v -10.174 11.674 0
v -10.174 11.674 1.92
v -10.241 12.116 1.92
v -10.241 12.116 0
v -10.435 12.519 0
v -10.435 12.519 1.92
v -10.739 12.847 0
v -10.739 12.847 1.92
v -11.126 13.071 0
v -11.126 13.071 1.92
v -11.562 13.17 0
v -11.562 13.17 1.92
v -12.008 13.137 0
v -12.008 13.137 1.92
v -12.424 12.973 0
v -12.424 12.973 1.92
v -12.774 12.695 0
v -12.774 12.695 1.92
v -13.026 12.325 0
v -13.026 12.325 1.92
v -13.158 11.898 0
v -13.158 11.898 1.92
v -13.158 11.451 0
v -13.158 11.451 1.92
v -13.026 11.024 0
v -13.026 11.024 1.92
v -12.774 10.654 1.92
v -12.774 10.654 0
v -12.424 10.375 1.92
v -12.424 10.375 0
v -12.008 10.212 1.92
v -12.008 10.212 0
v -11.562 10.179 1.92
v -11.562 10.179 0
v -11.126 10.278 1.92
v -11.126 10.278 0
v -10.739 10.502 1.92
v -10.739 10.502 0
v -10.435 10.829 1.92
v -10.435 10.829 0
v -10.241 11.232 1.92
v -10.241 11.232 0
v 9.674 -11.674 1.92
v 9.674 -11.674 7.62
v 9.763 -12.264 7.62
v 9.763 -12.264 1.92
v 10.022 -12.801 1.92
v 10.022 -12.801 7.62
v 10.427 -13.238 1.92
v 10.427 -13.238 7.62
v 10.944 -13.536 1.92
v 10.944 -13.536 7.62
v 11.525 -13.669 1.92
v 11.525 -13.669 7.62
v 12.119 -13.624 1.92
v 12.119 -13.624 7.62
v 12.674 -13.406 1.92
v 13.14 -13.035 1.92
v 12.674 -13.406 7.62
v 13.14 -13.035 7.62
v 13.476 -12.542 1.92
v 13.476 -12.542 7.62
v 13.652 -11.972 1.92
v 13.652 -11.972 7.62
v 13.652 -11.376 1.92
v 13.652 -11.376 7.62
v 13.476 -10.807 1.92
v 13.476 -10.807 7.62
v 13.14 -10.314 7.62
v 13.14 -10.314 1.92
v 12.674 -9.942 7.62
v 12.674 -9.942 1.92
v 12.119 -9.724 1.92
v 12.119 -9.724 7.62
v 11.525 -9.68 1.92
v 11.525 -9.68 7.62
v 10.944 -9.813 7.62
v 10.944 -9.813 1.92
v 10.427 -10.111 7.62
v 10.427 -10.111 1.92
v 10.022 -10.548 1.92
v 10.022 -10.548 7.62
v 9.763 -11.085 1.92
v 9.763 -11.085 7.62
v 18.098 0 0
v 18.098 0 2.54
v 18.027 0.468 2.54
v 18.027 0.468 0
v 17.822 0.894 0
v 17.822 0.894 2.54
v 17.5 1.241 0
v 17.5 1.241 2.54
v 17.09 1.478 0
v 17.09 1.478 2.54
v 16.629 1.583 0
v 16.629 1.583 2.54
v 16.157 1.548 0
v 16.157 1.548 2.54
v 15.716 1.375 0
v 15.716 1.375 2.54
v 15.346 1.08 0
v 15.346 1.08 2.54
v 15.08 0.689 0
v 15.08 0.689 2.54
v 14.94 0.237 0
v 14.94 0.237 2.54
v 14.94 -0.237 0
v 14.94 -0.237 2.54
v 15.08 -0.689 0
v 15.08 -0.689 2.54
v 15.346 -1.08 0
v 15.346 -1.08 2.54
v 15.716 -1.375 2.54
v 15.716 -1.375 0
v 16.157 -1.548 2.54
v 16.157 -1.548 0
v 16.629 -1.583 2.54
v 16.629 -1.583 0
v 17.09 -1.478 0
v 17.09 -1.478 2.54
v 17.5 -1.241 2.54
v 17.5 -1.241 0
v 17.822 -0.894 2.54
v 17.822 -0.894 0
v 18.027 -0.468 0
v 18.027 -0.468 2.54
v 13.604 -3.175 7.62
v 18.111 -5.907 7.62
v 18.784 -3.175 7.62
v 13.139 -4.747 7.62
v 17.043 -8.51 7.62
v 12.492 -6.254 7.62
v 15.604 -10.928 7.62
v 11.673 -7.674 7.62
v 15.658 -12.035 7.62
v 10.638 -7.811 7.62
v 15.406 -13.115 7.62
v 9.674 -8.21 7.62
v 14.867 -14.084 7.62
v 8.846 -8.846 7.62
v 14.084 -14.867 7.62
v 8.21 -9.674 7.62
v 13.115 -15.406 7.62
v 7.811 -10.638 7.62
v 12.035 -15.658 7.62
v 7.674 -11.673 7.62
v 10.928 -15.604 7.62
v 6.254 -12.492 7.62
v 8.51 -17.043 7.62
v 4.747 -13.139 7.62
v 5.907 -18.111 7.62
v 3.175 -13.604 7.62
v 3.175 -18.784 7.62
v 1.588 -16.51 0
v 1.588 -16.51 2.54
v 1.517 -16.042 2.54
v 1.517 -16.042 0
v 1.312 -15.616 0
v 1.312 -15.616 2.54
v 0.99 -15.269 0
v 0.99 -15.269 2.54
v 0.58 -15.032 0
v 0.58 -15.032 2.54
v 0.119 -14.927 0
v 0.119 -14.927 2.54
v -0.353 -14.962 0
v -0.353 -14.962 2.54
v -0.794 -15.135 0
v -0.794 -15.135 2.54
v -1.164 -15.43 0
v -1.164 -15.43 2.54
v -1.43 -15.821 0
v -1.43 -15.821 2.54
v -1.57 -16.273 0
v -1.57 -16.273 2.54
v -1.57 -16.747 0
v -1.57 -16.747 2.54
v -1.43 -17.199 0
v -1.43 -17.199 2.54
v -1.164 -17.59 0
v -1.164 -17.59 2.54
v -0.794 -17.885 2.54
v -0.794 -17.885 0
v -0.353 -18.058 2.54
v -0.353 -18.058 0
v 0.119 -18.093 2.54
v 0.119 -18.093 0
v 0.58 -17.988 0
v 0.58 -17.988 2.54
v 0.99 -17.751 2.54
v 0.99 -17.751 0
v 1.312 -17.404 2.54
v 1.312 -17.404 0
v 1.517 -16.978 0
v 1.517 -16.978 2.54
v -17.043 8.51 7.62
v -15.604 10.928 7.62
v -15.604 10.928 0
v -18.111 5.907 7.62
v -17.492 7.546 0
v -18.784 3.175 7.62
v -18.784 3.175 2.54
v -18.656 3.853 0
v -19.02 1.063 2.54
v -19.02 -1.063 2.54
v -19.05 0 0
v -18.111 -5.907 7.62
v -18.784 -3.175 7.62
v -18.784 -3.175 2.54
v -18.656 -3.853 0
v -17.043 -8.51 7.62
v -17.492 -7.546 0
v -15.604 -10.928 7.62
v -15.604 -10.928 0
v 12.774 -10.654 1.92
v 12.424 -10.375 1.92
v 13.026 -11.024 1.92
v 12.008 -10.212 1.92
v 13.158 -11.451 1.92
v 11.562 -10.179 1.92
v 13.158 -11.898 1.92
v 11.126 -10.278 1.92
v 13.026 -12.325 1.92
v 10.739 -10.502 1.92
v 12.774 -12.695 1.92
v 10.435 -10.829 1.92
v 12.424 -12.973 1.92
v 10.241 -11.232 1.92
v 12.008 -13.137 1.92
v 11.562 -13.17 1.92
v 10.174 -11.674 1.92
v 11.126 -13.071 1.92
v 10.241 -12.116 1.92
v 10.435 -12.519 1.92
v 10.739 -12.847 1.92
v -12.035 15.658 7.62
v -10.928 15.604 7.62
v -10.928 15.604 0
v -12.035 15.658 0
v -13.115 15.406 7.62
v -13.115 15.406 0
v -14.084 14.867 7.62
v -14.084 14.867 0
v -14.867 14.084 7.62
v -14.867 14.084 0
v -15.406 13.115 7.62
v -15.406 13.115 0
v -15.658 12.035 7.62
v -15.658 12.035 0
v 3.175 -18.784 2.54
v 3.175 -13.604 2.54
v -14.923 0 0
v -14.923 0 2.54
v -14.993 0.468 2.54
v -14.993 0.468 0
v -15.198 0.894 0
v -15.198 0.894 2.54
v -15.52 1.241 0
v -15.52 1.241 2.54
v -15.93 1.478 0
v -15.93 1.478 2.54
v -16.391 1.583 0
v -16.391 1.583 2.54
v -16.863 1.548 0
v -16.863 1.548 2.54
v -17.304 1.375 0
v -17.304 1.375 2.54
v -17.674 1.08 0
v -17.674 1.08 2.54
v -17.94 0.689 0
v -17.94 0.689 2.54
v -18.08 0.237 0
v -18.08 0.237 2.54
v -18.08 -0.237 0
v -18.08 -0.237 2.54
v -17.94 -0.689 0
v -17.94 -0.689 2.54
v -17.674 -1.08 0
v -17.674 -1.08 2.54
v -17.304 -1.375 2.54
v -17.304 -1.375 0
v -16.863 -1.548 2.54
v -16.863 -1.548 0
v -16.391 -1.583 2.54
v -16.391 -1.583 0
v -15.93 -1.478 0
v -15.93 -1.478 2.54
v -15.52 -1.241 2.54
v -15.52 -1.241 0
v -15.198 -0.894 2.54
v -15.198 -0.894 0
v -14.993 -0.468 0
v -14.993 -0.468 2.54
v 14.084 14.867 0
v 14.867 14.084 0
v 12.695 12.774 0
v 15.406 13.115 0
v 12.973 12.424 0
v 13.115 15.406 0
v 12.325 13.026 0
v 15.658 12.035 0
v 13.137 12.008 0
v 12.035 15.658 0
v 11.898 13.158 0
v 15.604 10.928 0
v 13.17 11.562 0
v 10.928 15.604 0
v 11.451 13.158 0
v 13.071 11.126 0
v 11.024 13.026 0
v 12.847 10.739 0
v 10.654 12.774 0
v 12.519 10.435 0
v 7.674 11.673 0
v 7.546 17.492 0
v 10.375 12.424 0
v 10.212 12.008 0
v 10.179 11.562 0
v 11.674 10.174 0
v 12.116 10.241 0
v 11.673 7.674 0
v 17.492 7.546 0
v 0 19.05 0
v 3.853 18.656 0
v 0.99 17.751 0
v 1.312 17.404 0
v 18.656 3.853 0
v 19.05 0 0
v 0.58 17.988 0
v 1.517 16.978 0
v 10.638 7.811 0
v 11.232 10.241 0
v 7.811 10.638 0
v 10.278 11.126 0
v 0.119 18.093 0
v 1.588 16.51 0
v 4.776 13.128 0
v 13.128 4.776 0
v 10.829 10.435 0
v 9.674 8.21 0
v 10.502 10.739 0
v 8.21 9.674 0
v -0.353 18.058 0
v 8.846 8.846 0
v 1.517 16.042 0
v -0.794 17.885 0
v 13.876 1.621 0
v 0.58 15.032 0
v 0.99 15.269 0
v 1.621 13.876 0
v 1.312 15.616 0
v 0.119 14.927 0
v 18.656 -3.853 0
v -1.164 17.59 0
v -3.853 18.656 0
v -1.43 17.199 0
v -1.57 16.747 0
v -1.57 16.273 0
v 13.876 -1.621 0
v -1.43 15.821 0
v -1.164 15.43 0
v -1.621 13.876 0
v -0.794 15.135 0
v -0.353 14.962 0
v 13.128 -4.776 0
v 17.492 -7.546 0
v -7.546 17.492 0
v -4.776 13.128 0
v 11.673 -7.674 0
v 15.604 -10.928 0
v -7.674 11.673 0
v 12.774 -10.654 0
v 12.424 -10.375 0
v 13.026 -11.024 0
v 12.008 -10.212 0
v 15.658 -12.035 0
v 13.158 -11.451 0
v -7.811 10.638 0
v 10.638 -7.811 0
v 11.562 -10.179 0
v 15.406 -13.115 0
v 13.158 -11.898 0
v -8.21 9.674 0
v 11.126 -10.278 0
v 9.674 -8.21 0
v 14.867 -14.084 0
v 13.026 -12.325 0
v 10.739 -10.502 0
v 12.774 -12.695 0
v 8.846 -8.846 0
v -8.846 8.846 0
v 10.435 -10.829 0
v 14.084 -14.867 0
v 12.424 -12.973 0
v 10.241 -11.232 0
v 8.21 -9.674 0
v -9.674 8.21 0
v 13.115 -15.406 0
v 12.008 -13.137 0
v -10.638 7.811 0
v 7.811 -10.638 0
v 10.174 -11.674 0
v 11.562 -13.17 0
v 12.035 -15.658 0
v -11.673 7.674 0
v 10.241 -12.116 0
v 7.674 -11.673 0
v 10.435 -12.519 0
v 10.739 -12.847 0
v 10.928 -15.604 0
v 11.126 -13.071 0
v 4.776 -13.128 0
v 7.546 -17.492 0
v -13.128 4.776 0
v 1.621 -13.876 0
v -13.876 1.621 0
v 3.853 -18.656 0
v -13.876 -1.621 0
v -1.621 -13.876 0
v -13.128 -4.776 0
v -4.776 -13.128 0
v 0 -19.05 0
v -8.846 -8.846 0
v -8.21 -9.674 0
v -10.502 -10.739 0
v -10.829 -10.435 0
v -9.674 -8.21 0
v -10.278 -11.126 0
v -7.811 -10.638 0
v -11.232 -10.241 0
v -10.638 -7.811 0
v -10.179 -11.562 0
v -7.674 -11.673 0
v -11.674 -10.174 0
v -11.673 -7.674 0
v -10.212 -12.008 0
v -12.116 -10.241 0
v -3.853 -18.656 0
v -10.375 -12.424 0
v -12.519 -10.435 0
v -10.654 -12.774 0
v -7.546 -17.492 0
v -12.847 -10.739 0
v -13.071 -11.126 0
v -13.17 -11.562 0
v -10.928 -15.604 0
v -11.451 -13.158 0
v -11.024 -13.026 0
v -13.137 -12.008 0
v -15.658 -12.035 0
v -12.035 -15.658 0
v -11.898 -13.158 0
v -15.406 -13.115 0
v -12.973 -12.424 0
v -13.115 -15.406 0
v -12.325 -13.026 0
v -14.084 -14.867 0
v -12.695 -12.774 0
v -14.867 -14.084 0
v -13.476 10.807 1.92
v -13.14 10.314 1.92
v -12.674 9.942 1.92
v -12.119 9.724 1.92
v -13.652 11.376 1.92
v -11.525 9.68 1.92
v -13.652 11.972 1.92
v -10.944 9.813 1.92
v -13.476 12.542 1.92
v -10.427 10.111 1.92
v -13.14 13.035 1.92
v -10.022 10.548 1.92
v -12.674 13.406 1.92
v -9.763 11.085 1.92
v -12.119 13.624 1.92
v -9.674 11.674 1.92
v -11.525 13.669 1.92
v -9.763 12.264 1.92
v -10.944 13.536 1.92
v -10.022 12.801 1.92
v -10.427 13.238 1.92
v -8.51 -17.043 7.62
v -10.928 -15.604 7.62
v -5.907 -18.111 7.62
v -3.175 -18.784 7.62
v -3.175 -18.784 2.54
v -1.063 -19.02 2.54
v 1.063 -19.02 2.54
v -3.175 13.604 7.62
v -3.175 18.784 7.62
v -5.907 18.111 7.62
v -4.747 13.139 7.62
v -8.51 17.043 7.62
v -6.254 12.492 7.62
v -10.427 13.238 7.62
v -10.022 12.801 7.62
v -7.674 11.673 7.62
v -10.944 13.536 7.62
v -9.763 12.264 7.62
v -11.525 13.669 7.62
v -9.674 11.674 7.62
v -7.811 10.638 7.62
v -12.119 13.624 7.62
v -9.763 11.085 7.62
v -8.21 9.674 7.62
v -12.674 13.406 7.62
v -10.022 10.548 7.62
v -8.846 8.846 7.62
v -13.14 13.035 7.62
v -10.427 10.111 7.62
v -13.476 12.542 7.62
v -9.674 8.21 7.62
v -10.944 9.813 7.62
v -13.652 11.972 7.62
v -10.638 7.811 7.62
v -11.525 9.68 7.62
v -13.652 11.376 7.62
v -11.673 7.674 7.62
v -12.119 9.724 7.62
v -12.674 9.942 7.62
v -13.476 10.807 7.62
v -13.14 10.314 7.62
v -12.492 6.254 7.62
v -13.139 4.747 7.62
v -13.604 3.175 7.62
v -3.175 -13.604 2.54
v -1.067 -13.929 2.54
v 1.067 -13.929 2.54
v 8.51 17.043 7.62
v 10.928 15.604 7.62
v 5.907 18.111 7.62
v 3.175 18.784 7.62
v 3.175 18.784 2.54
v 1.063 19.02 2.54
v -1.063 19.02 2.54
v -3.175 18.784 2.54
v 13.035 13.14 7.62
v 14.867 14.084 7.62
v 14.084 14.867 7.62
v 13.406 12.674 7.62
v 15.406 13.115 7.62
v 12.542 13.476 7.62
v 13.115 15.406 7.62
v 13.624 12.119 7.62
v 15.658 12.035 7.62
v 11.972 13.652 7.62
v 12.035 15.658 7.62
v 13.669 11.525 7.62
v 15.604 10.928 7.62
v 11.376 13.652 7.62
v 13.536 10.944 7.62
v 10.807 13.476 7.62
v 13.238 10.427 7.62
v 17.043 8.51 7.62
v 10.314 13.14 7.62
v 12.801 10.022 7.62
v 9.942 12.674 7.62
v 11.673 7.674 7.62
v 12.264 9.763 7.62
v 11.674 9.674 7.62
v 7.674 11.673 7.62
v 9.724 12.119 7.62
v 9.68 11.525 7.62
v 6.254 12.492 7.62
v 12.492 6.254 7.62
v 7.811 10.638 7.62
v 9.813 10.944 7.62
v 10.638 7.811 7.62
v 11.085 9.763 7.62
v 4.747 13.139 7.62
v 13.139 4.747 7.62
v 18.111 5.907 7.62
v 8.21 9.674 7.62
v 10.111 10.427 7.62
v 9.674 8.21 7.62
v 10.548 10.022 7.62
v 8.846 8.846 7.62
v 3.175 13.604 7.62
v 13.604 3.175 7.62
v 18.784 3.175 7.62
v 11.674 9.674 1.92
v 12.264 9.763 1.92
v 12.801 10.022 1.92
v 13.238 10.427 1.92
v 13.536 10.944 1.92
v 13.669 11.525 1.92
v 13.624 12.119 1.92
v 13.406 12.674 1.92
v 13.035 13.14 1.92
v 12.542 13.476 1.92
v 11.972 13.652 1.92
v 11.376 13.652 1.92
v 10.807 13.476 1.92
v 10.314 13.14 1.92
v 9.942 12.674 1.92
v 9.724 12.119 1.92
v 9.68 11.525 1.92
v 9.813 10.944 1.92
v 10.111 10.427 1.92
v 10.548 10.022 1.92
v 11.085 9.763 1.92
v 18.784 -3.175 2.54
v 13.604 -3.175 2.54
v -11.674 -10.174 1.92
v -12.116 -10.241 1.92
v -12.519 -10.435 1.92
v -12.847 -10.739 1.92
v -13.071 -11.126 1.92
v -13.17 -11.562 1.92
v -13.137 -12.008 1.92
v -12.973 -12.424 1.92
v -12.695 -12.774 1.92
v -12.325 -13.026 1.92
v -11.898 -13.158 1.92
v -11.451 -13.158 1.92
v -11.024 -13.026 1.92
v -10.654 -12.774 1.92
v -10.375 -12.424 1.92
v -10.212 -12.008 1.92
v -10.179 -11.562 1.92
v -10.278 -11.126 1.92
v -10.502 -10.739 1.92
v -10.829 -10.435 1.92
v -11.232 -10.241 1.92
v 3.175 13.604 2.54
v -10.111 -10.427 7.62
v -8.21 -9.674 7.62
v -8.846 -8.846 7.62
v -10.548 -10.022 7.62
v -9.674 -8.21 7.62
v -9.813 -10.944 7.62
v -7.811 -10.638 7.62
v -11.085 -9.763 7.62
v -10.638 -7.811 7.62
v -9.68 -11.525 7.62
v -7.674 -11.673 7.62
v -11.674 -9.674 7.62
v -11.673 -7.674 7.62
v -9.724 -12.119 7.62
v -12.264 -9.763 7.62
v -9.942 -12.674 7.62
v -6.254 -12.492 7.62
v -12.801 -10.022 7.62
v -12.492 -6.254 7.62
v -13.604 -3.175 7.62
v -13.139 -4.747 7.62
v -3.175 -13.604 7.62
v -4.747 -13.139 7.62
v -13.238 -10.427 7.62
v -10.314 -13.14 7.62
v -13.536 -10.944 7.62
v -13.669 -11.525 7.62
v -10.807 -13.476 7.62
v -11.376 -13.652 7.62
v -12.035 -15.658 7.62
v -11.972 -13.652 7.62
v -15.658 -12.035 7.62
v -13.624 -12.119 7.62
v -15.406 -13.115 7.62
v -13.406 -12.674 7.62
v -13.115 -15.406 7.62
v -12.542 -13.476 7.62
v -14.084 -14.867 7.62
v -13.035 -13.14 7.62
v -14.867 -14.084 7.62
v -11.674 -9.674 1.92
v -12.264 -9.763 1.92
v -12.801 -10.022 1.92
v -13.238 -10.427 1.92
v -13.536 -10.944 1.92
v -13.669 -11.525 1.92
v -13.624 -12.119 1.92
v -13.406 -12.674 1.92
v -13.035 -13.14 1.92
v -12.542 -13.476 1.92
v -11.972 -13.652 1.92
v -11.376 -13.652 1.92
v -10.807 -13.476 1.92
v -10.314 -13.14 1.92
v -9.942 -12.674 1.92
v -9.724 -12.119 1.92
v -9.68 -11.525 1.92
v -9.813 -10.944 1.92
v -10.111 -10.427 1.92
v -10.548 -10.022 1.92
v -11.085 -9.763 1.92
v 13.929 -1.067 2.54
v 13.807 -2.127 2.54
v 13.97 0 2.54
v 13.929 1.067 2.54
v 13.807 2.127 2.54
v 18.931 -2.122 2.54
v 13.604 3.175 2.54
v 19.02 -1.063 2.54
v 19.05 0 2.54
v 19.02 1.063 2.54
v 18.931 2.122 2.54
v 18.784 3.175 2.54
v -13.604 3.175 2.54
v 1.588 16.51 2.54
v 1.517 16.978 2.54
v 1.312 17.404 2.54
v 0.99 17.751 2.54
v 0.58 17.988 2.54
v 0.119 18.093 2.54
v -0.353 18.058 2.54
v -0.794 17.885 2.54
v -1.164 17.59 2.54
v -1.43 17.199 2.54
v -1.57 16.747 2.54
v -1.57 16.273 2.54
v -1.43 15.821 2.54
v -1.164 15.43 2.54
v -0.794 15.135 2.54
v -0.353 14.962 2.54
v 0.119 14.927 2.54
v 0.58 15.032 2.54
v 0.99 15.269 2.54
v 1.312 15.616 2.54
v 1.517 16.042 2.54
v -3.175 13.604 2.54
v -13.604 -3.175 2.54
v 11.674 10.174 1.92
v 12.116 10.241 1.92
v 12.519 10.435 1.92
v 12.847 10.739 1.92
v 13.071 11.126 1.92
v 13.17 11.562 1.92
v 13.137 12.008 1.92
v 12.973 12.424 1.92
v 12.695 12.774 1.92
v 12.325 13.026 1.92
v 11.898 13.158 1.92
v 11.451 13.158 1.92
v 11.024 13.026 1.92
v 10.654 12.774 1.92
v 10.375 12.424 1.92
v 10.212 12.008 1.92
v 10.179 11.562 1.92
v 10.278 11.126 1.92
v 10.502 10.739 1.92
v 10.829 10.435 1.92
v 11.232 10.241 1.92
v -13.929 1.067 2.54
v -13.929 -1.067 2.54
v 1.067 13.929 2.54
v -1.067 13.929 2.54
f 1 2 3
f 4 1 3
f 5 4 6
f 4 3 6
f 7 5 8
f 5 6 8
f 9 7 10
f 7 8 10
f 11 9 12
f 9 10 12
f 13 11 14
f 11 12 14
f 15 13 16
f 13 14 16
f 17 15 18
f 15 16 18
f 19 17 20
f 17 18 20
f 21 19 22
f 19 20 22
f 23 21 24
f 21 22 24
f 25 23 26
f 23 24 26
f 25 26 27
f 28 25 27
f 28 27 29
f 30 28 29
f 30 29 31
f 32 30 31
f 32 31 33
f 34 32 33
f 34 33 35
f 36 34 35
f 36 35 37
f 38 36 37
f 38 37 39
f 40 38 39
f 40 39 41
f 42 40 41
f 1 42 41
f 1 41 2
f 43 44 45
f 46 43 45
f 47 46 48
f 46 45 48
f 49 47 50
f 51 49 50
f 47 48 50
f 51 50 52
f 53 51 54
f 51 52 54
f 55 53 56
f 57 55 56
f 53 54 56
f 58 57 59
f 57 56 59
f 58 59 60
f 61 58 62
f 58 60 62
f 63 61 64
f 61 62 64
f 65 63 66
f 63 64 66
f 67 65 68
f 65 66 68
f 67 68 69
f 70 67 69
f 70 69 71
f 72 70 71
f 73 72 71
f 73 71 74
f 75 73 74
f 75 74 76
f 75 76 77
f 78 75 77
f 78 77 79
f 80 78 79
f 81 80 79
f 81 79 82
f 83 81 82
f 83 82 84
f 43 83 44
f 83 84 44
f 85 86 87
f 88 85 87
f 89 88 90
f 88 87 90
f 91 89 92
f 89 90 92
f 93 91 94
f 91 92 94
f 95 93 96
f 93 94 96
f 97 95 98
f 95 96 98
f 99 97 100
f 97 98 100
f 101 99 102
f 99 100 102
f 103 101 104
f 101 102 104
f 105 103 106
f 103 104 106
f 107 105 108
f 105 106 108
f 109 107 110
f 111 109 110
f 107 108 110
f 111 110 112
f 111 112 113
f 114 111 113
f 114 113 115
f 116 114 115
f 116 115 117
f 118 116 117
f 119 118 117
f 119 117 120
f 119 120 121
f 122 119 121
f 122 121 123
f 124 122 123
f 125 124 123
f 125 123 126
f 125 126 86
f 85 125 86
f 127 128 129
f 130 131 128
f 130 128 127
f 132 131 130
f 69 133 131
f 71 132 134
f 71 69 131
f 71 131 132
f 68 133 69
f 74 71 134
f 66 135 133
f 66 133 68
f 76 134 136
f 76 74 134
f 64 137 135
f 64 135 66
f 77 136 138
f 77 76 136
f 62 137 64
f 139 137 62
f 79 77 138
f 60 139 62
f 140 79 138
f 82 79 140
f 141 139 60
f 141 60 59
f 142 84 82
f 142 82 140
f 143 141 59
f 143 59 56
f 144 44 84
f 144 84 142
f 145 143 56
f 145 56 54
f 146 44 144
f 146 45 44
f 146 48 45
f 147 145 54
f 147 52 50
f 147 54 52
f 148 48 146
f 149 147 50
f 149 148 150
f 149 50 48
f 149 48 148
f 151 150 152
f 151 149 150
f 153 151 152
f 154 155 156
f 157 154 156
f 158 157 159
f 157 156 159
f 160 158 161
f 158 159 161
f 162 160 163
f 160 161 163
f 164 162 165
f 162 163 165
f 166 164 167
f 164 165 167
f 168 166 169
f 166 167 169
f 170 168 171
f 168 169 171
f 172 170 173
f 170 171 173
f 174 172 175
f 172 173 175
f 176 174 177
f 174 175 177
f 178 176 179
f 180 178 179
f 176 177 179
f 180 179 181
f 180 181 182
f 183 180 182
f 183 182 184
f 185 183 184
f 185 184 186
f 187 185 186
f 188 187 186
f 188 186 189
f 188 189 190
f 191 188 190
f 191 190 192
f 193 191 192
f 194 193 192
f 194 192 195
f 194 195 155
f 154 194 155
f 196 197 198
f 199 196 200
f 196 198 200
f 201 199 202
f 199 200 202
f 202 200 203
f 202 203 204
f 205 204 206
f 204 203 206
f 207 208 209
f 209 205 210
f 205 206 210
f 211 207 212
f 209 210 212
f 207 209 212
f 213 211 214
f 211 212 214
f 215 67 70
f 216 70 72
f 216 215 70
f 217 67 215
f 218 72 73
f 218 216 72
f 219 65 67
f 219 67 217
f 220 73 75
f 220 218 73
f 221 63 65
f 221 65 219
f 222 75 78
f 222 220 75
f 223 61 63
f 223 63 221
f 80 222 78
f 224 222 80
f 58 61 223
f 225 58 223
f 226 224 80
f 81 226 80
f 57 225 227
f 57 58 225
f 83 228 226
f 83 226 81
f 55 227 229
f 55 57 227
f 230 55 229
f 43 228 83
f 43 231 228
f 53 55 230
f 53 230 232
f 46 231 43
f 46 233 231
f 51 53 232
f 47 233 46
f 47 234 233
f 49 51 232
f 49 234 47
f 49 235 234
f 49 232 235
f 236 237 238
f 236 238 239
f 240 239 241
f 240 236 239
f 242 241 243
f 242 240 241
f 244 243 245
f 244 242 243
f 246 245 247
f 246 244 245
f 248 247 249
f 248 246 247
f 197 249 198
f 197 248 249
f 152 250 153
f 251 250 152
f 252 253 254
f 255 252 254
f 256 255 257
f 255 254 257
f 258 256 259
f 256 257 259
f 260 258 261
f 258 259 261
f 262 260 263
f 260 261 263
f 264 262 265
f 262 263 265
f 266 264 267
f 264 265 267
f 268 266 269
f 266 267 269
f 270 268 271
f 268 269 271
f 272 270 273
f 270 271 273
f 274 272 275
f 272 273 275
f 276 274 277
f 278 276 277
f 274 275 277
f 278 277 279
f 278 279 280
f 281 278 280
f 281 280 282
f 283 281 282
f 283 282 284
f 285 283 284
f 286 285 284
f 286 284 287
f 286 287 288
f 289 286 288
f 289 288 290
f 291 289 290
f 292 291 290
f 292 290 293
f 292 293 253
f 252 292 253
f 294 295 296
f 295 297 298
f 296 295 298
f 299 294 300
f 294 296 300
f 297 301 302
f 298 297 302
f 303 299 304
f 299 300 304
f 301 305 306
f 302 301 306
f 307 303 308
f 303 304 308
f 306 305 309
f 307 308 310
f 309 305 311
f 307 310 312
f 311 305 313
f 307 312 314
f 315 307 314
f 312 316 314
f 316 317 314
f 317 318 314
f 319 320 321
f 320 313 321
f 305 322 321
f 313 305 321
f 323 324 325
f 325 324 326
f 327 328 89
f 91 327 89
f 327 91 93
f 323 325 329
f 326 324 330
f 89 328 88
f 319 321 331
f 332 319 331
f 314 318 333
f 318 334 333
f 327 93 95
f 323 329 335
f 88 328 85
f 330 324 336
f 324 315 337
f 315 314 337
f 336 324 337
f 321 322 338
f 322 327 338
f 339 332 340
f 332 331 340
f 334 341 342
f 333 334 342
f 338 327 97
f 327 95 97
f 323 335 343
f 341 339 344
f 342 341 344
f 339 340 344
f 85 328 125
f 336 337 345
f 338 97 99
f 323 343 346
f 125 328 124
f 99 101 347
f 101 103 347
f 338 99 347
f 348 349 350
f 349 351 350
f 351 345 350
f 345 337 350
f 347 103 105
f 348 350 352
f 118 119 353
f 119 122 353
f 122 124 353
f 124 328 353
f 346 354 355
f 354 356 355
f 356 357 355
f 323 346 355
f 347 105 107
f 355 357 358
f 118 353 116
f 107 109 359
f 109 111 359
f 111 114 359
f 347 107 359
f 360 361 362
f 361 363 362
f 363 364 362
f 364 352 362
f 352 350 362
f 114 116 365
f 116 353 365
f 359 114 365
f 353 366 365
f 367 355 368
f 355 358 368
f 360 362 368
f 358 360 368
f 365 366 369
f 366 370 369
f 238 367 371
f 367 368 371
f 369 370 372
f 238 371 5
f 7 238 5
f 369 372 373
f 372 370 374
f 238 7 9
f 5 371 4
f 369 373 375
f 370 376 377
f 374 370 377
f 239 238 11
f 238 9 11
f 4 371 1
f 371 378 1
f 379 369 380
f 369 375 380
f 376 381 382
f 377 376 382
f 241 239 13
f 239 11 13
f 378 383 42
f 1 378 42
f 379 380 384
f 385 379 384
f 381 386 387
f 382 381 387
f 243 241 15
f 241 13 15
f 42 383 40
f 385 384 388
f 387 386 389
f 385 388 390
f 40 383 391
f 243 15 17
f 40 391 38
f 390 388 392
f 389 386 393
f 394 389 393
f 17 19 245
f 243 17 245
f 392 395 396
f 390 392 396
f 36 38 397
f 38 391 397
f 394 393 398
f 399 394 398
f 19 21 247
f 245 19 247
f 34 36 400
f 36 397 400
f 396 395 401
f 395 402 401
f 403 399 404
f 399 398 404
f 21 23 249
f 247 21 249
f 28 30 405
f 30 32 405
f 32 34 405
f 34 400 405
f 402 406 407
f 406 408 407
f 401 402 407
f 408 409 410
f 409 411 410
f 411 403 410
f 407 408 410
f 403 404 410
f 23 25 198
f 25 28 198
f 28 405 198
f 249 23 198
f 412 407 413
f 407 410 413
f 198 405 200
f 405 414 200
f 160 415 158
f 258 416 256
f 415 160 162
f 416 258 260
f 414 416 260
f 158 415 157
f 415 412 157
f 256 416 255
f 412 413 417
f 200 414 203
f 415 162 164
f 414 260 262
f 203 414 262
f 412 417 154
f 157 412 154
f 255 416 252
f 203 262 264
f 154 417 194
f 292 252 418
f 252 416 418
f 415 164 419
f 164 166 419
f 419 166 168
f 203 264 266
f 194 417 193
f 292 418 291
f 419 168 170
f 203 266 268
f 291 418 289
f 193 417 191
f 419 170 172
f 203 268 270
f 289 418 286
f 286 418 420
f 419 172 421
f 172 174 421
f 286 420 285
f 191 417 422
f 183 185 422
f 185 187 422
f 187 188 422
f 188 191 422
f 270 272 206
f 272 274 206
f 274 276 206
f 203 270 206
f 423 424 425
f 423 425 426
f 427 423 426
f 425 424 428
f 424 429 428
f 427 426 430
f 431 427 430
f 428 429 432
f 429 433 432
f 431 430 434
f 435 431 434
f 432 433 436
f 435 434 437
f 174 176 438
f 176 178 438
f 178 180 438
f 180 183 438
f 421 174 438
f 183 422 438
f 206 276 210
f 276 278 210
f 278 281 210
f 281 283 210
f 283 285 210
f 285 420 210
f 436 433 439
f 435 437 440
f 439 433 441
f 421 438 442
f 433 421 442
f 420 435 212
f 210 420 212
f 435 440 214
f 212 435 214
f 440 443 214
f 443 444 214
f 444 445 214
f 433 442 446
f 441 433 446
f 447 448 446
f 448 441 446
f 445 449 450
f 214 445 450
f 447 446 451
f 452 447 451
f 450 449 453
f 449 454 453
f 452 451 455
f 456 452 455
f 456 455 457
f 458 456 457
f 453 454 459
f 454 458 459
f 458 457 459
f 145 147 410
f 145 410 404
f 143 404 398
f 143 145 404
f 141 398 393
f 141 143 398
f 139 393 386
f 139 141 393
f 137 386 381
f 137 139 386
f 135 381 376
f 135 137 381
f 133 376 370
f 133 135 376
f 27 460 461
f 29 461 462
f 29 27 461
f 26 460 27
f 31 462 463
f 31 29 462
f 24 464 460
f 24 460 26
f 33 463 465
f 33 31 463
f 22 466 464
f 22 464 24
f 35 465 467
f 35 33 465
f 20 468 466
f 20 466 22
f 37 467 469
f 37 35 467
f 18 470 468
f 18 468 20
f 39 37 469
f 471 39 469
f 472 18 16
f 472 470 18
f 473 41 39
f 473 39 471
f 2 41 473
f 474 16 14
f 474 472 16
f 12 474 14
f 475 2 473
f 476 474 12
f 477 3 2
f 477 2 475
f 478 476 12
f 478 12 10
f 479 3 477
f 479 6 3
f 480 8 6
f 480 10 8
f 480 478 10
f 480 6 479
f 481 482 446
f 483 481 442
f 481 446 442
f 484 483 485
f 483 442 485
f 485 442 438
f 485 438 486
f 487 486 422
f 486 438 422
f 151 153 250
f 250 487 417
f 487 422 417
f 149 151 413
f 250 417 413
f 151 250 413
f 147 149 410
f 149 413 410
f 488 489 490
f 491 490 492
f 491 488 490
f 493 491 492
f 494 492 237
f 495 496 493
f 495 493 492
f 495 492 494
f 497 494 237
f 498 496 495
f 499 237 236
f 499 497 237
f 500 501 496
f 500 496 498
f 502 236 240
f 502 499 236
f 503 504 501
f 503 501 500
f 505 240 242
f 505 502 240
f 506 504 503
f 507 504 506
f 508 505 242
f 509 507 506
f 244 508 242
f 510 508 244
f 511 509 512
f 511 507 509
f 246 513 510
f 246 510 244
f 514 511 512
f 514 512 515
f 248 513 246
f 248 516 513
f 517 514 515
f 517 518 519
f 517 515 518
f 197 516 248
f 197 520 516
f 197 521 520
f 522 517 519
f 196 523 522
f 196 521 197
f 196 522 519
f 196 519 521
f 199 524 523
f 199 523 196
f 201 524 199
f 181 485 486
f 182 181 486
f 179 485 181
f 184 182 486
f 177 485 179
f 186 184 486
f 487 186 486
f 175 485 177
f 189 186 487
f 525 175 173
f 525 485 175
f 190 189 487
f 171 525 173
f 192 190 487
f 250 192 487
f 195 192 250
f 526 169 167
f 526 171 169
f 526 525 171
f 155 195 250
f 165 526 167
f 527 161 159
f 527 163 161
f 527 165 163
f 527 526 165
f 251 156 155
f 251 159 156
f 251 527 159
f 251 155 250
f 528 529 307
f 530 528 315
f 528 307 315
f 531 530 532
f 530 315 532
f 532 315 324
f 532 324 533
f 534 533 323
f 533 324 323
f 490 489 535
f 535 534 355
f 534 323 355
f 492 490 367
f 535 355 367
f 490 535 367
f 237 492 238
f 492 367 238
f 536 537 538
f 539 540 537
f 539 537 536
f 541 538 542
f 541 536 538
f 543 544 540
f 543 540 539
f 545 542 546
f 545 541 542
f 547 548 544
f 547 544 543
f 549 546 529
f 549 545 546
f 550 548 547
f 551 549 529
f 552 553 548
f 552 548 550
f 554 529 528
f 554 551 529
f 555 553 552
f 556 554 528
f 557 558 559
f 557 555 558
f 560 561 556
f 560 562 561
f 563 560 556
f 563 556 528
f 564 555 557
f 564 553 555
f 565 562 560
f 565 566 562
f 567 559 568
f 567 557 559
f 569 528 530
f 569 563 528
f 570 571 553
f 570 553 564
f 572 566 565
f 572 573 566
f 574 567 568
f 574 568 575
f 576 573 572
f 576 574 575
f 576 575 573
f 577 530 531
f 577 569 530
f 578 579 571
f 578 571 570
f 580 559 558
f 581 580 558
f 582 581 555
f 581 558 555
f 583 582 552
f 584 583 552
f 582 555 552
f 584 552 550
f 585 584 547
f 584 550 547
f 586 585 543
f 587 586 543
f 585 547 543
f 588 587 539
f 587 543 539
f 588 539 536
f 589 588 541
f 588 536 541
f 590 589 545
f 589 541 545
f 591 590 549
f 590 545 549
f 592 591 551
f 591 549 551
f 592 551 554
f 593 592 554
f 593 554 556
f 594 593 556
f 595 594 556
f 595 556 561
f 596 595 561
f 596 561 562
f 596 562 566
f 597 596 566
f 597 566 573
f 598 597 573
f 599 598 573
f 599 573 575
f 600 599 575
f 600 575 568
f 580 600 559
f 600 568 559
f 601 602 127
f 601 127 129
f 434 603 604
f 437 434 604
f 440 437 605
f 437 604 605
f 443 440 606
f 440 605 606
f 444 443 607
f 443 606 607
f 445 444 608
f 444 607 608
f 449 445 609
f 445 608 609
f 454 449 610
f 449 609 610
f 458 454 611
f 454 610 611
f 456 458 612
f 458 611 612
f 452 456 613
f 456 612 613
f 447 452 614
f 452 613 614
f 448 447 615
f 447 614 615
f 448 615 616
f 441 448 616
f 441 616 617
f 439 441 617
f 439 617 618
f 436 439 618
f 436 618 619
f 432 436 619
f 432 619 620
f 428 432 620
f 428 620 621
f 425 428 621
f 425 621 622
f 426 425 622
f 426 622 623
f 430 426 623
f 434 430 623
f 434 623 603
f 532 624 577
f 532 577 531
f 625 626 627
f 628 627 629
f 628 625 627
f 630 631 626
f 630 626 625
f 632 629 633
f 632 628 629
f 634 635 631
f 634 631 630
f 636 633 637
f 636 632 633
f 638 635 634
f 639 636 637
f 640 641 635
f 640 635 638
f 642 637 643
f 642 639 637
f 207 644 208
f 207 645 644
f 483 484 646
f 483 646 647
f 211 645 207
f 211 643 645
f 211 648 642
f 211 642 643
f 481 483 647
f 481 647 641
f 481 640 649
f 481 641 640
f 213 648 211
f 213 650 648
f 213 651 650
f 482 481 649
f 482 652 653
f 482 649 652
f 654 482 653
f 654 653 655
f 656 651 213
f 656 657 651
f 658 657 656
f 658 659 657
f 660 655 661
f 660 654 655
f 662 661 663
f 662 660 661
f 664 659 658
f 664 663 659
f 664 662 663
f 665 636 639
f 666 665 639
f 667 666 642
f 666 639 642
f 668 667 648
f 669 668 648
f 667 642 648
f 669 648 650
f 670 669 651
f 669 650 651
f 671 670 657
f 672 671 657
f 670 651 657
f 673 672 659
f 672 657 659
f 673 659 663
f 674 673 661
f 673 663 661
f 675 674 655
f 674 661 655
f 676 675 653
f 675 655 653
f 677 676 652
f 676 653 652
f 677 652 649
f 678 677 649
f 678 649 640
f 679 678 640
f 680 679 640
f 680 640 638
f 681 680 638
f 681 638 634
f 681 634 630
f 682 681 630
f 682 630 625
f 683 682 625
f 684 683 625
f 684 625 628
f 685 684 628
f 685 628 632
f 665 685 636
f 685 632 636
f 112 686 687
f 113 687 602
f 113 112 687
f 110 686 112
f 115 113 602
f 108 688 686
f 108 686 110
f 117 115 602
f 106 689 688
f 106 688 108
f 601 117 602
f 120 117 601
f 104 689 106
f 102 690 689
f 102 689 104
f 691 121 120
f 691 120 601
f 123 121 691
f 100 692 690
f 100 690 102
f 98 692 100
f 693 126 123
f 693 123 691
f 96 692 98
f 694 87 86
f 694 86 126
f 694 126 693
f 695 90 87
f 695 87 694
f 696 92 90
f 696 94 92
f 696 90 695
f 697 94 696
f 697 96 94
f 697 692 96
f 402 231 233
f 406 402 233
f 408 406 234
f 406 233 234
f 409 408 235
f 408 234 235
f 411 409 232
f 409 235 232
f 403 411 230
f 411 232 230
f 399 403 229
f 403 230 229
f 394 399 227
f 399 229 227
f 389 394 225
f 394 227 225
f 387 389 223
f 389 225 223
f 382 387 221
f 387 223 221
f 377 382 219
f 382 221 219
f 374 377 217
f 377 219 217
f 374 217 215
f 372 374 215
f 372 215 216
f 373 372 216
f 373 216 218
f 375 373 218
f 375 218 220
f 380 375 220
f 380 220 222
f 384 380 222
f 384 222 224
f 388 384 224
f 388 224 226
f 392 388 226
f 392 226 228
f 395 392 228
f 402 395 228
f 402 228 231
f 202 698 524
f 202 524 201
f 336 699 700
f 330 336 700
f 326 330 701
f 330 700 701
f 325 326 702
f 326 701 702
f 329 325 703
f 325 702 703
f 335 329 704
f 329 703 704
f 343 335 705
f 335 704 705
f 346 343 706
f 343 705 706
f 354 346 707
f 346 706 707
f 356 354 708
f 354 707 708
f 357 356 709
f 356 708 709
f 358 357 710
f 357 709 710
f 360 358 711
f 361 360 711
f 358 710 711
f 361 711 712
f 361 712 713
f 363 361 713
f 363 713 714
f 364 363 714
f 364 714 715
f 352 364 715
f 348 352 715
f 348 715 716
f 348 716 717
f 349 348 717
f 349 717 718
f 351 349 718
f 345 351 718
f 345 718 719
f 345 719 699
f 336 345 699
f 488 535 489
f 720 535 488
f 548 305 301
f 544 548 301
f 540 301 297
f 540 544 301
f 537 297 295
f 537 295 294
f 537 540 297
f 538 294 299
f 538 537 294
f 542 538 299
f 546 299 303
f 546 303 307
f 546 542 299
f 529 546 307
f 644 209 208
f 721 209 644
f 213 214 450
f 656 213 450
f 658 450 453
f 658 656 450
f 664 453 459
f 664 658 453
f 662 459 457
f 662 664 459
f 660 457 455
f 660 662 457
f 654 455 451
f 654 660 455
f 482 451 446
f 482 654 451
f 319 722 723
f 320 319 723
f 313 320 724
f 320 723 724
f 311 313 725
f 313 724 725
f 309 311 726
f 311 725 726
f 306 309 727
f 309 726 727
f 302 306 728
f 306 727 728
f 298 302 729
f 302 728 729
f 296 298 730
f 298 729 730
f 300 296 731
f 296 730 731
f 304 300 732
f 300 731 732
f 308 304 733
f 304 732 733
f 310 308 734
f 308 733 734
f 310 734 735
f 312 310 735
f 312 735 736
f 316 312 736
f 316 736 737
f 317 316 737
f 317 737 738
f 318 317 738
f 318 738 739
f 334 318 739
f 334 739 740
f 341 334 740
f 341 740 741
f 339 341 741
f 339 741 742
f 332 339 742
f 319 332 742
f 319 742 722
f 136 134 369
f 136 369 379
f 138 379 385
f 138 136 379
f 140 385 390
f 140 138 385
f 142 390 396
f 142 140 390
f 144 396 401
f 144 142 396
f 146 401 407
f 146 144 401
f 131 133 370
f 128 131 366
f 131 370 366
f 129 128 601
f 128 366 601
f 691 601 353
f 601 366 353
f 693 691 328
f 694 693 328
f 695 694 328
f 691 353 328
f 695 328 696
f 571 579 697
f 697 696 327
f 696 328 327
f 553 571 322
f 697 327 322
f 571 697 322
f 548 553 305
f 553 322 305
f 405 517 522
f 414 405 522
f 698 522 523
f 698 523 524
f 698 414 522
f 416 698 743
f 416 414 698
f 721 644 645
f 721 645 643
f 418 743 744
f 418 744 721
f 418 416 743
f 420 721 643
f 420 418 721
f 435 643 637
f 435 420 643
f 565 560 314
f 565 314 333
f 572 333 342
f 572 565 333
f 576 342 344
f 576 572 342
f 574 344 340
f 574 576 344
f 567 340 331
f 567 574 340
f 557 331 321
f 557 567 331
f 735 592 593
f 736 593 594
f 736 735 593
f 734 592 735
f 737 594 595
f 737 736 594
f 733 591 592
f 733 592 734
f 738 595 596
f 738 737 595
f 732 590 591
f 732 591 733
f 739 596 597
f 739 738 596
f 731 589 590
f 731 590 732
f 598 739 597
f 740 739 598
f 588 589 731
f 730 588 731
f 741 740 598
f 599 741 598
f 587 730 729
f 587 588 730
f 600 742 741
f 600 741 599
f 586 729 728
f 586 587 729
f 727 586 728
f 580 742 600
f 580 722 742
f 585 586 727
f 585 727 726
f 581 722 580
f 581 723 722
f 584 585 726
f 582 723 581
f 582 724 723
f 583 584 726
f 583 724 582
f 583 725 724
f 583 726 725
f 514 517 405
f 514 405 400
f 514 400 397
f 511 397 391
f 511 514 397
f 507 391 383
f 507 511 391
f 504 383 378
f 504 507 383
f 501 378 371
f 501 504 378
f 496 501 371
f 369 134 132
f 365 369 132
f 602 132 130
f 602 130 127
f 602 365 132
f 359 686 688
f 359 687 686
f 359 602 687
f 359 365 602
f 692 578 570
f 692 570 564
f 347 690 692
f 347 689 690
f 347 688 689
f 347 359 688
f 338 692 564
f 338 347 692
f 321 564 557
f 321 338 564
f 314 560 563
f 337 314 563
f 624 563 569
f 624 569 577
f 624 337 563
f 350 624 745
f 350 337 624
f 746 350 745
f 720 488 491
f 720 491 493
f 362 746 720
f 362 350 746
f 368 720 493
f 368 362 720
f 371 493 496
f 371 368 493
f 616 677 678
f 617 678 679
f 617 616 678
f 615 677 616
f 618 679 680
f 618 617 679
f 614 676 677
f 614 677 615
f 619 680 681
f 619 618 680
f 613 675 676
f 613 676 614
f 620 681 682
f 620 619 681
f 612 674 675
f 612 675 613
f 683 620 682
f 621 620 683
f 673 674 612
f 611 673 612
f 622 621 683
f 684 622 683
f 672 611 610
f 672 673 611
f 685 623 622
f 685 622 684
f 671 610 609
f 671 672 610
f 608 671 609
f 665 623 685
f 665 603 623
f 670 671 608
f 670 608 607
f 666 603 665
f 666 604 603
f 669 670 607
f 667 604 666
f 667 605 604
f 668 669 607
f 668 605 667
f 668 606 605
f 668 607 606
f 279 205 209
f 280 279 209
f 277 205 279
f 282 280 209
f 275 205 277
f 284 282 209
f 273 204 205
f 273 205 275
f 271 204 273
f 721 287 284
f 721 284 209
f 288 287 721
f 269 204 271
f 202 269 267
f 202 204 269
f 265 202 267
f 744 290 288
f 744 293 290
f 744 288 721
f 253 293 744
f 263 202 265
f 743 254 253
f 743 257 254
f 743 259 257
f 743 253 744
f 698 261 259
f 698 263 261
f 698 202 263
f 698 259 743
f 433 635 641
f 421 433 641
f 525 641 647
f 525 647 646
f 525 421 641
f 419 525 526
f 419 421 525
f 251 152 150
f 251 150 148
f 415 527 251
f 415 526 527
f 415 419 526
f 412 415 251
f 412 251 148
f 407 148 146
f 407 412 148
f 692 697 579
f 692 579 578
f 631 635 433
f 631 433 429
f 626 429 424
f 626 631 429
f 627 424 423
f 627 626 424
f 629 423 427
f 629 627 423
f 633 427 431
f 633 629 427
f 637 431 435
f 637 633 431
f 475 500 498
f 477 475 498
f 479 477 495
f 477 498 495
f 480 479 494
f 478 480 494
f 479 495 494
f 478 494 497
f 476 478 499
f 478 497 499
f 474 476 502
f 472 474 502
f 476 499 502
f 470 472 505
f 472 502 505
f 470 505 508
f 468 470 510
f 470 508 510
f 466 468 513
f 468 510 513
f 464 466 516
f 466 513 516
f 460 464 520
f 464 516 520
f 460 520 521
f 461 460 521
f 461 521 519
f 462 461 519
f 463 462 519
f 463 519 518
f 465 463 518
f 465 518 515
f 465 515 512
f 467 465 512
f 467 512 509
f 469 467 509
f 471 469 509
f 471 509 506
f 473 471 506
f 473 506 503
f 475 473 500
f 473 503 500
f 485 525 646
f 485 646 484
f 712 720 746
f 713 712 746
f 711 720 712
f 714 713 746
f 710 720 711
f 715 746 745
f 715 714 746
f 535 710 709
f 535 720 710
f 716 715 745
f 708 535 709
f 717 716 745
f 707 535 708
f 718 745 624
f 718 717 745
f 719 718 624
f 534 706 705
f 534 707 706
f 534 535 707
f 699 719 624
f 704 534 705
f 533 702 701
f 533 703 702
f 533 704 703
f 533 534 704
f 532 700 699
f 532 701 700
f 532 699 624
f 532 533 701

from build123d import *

# Parameters (mm, degrees)
SKETCH1_R           = 19.05
SKETCH1_R_2         = 13.97
BOSS_EXTRUDE1_DEPTH = 7.62
SKETCH2_R           = 1.5875
CUT_EXTRUDE1_DEPTH  = 28.99766776
CUT_EXTRUDE2_START  = -5.08
SKETCH3_R           = 1.5875
CUT_EXTRUDE2_DEPTH  = 5.08
SKETCH4_R           = 1.5
CUT_EXTRUDE3_DEPTH  = 28.99766776
SKETCH5_R           = 2
CUT_EXTRUDE4_DEPTH  = 5.7
SKETCH6_R           = 4
SKETCH6_R_2         = 2
BOSS_EXTRUDE2_DEPTH = 7.62
CIRPATTERN1_COUNT   = 4


with BuildPart() as part:
    # Sketch1 → Boss-Extrude1 (new body)
    with BuildSketch(Plane.XY):
        with Locations(Location((0, 0, 0), (0, 0, 180))):
            Circle(SKETCH1_R)
        with Locations(Location((0, 0, 0), (0, 0, 180))):
            Circle(SKETCH1_R_2, mode=Mode.SUBTRACT)
    extrude(amount=BOSS_EXTRUDE1_DEPTH)

    # Sketch2 → Cut-Extrude1 (cut, through all)
    with BuildSketch(Plane.XY.offset(7.62)):
        with Locations((0, 16.51)):
            Circle(SKETCH2_R)
        with Locations((16.51, 0)):
            Circle(SKETCH2_R)
        with Locations((0, -16.51)):
            Circle(SKETCH2_R)
        with Locations((-16.51, 0)):
            Circle(SKETCH2_R)
    extrude(amount=-CUT_EXTRUDE1_DEPTH, mode=Mode.SUBTRACT)

    # Sketch3 → Cut-Extrude2 (cut)
    # profile 1 of 4: a face of its own
    with BuildSketch(Plane.XY.offset(7.62).offset(CUT_EXTRUDE2_START)):
        with BuildLine():
            ThreePointArc((-18.783553311, 3.175), (-19.05, 0), (-18.783553311, -3.175))
            Line((-18.783553311, -3.175), (-13.604421156, -3.175))
            ThreePointArc((-13.604421156, -3.175), (-13.97, 0), (-13.604421156, 3.175))
            Line((-13.604421156, 3.175), (-18.783553311, 3.175))
        make_face()
        with Locations((-16.51, 0)):
            Circle(SKETCH3_R, mode=Mode.SUBTRACT)
    # profile 2 of 4: a face of its own
    with BuildSketch(Plane.XY.offset(7.62).offset(CUT_EXTRUDE2_START)):
        with BuildLine():
            Line((-3.175, -13.604421156), (-3.175, -18.783553311))
            ThreePointArc((-3.175, -18.783553311), (0, -19.05), (3.175, -18.783553311))
            Line((3.175, -18.783553311), (3.175, -13.604421156))
            ThreePointArc((3.175, -13.604421156), (0, -13.97), (-3.175, -13.604421156))
        make_face()
        with Locations((0, -16.51)):
            Circle(SKETCH3_R, mode=Mode.SUBTRACT)
    # profile 3 of 4: a face of its own
    with BuildSketch(Plane.XY.offset(7.62).offset(CUT_EXTRUDE2_START)):
        with BuildLine():
            Line((13.604421156, -3.175), (18.783553311, -3.175))
            ThreePointArc((18.783553311, -3.175), (18.983271459, -1.593080258), (19.05, 0))
            ThreePointArc((19.05, 0), (18.983271459, 1.593080258), (18.783553311, 3.175))
            Line((18.783553311, 3.175), (13.604421156, 3.175))
            ThreePointArc((13.604421156, 3.175), (13.878304355, 1.597988806), (13.97, 0))
            ThreePointArc((13.97, 0), (13.878304355, -1.597988806), (13.604421156, -3.175))
        make_face()
        with Locations((16.51, 0)):
            Circle(SKETCH3_R, mode=Mode.SUBTRACT)
    # profile 4 of 4: a face of its own
    with BuildSketch(Plane.XY.offset(7.62).offset(CUT_EXTRUDE2_START)):
        with BuildLine():
            ThreePointArc((3.175, 18.783553311), (0, 19.05), (-3.175, 18.783553311))
            Line((-3.175, 18.783553311), (-3.175, 13.604421156))
            ThreePointArc((-3.175, 13.604421156), (0, 13.97), (3.175, 13.604421156))
            Line((3.175, 13.604421156), (3.175, 18.783553311))
        make_face()
        with Locations((0, 16.51)):
            Circle(SKETCH3_R, mode=Mode.SUBTRACT)
    extrude(amount=CUT_EXTRUDE2_DEPTH, mode=Mode.SUBTRACT)

    # Sketch4 → Cut-Extrude3 (cut, through all)
    with BuildSketch(Plane.XY.offset(7.62)):
        with Locations((-11.674332957, 11.674332957)):
            Circle(SKETCH4_R)
    cut_extrude3 = extrude(amount=-CUT_EXTRUDE3_DEPTH, mode=Mode.SUBTRACT)

    # Sketch5 → Cut-Extrude4 (cut)
    with BuildSketch(Plane.XY.offset(7.62)):
        with Locations((-11.674332957, 11.674332957)):
            Circle(SKETCH5_R)
    cut_extrude4 = extrude(amount=-CUT_EXTRUDE4_DEPTH, mode=Mode.SUBTRACT)

    # Sketch6 → Boss-Extrude2 (add)
    with BuildSketch(Plane.XY.offset(7.62)):
        with Locations((-11.674332957, 11.674332957)):
            Circle(SKETCH6_R)
        with Locations((-11.674332957, 11.674332957)):
            Circle(SKETCH6_R_2, mode=Mode.SUBTRACT)
    boss_extrude2 = extrude(amount=-BOSS_EXTRUDE2_DEPTH)

    # CirPattern1: Cut-Extrude3, Cut-Extrude4, Boss-Extrude2 ×4 about axis
    cirpattern1_axis = Axis((0, 0, 0), (0, 0, 1))
    add([cut_extrude3.rotate(cirpattern1_axis, i * 360 / CIRPATTERN1_COUNT) for i in range(1, CIRPATTERN1_COUNT)], mode=Mode.SUBTRACT)
    add([cut_extrude4.rotate(cirpattern1_axis, i * 360 / CIRPATTERN1_COUNT) for i in range(1, CIRPATTERN1_COUNT)], mode=Mode.SUBTRACT)
    add([boss_extrude2.rotate(cirpattern1_axis, i * 360 / CIRPATTERN1_COUNT) for i in range(1, CIRPATTERN1_COUNT)])


solid = part.part
